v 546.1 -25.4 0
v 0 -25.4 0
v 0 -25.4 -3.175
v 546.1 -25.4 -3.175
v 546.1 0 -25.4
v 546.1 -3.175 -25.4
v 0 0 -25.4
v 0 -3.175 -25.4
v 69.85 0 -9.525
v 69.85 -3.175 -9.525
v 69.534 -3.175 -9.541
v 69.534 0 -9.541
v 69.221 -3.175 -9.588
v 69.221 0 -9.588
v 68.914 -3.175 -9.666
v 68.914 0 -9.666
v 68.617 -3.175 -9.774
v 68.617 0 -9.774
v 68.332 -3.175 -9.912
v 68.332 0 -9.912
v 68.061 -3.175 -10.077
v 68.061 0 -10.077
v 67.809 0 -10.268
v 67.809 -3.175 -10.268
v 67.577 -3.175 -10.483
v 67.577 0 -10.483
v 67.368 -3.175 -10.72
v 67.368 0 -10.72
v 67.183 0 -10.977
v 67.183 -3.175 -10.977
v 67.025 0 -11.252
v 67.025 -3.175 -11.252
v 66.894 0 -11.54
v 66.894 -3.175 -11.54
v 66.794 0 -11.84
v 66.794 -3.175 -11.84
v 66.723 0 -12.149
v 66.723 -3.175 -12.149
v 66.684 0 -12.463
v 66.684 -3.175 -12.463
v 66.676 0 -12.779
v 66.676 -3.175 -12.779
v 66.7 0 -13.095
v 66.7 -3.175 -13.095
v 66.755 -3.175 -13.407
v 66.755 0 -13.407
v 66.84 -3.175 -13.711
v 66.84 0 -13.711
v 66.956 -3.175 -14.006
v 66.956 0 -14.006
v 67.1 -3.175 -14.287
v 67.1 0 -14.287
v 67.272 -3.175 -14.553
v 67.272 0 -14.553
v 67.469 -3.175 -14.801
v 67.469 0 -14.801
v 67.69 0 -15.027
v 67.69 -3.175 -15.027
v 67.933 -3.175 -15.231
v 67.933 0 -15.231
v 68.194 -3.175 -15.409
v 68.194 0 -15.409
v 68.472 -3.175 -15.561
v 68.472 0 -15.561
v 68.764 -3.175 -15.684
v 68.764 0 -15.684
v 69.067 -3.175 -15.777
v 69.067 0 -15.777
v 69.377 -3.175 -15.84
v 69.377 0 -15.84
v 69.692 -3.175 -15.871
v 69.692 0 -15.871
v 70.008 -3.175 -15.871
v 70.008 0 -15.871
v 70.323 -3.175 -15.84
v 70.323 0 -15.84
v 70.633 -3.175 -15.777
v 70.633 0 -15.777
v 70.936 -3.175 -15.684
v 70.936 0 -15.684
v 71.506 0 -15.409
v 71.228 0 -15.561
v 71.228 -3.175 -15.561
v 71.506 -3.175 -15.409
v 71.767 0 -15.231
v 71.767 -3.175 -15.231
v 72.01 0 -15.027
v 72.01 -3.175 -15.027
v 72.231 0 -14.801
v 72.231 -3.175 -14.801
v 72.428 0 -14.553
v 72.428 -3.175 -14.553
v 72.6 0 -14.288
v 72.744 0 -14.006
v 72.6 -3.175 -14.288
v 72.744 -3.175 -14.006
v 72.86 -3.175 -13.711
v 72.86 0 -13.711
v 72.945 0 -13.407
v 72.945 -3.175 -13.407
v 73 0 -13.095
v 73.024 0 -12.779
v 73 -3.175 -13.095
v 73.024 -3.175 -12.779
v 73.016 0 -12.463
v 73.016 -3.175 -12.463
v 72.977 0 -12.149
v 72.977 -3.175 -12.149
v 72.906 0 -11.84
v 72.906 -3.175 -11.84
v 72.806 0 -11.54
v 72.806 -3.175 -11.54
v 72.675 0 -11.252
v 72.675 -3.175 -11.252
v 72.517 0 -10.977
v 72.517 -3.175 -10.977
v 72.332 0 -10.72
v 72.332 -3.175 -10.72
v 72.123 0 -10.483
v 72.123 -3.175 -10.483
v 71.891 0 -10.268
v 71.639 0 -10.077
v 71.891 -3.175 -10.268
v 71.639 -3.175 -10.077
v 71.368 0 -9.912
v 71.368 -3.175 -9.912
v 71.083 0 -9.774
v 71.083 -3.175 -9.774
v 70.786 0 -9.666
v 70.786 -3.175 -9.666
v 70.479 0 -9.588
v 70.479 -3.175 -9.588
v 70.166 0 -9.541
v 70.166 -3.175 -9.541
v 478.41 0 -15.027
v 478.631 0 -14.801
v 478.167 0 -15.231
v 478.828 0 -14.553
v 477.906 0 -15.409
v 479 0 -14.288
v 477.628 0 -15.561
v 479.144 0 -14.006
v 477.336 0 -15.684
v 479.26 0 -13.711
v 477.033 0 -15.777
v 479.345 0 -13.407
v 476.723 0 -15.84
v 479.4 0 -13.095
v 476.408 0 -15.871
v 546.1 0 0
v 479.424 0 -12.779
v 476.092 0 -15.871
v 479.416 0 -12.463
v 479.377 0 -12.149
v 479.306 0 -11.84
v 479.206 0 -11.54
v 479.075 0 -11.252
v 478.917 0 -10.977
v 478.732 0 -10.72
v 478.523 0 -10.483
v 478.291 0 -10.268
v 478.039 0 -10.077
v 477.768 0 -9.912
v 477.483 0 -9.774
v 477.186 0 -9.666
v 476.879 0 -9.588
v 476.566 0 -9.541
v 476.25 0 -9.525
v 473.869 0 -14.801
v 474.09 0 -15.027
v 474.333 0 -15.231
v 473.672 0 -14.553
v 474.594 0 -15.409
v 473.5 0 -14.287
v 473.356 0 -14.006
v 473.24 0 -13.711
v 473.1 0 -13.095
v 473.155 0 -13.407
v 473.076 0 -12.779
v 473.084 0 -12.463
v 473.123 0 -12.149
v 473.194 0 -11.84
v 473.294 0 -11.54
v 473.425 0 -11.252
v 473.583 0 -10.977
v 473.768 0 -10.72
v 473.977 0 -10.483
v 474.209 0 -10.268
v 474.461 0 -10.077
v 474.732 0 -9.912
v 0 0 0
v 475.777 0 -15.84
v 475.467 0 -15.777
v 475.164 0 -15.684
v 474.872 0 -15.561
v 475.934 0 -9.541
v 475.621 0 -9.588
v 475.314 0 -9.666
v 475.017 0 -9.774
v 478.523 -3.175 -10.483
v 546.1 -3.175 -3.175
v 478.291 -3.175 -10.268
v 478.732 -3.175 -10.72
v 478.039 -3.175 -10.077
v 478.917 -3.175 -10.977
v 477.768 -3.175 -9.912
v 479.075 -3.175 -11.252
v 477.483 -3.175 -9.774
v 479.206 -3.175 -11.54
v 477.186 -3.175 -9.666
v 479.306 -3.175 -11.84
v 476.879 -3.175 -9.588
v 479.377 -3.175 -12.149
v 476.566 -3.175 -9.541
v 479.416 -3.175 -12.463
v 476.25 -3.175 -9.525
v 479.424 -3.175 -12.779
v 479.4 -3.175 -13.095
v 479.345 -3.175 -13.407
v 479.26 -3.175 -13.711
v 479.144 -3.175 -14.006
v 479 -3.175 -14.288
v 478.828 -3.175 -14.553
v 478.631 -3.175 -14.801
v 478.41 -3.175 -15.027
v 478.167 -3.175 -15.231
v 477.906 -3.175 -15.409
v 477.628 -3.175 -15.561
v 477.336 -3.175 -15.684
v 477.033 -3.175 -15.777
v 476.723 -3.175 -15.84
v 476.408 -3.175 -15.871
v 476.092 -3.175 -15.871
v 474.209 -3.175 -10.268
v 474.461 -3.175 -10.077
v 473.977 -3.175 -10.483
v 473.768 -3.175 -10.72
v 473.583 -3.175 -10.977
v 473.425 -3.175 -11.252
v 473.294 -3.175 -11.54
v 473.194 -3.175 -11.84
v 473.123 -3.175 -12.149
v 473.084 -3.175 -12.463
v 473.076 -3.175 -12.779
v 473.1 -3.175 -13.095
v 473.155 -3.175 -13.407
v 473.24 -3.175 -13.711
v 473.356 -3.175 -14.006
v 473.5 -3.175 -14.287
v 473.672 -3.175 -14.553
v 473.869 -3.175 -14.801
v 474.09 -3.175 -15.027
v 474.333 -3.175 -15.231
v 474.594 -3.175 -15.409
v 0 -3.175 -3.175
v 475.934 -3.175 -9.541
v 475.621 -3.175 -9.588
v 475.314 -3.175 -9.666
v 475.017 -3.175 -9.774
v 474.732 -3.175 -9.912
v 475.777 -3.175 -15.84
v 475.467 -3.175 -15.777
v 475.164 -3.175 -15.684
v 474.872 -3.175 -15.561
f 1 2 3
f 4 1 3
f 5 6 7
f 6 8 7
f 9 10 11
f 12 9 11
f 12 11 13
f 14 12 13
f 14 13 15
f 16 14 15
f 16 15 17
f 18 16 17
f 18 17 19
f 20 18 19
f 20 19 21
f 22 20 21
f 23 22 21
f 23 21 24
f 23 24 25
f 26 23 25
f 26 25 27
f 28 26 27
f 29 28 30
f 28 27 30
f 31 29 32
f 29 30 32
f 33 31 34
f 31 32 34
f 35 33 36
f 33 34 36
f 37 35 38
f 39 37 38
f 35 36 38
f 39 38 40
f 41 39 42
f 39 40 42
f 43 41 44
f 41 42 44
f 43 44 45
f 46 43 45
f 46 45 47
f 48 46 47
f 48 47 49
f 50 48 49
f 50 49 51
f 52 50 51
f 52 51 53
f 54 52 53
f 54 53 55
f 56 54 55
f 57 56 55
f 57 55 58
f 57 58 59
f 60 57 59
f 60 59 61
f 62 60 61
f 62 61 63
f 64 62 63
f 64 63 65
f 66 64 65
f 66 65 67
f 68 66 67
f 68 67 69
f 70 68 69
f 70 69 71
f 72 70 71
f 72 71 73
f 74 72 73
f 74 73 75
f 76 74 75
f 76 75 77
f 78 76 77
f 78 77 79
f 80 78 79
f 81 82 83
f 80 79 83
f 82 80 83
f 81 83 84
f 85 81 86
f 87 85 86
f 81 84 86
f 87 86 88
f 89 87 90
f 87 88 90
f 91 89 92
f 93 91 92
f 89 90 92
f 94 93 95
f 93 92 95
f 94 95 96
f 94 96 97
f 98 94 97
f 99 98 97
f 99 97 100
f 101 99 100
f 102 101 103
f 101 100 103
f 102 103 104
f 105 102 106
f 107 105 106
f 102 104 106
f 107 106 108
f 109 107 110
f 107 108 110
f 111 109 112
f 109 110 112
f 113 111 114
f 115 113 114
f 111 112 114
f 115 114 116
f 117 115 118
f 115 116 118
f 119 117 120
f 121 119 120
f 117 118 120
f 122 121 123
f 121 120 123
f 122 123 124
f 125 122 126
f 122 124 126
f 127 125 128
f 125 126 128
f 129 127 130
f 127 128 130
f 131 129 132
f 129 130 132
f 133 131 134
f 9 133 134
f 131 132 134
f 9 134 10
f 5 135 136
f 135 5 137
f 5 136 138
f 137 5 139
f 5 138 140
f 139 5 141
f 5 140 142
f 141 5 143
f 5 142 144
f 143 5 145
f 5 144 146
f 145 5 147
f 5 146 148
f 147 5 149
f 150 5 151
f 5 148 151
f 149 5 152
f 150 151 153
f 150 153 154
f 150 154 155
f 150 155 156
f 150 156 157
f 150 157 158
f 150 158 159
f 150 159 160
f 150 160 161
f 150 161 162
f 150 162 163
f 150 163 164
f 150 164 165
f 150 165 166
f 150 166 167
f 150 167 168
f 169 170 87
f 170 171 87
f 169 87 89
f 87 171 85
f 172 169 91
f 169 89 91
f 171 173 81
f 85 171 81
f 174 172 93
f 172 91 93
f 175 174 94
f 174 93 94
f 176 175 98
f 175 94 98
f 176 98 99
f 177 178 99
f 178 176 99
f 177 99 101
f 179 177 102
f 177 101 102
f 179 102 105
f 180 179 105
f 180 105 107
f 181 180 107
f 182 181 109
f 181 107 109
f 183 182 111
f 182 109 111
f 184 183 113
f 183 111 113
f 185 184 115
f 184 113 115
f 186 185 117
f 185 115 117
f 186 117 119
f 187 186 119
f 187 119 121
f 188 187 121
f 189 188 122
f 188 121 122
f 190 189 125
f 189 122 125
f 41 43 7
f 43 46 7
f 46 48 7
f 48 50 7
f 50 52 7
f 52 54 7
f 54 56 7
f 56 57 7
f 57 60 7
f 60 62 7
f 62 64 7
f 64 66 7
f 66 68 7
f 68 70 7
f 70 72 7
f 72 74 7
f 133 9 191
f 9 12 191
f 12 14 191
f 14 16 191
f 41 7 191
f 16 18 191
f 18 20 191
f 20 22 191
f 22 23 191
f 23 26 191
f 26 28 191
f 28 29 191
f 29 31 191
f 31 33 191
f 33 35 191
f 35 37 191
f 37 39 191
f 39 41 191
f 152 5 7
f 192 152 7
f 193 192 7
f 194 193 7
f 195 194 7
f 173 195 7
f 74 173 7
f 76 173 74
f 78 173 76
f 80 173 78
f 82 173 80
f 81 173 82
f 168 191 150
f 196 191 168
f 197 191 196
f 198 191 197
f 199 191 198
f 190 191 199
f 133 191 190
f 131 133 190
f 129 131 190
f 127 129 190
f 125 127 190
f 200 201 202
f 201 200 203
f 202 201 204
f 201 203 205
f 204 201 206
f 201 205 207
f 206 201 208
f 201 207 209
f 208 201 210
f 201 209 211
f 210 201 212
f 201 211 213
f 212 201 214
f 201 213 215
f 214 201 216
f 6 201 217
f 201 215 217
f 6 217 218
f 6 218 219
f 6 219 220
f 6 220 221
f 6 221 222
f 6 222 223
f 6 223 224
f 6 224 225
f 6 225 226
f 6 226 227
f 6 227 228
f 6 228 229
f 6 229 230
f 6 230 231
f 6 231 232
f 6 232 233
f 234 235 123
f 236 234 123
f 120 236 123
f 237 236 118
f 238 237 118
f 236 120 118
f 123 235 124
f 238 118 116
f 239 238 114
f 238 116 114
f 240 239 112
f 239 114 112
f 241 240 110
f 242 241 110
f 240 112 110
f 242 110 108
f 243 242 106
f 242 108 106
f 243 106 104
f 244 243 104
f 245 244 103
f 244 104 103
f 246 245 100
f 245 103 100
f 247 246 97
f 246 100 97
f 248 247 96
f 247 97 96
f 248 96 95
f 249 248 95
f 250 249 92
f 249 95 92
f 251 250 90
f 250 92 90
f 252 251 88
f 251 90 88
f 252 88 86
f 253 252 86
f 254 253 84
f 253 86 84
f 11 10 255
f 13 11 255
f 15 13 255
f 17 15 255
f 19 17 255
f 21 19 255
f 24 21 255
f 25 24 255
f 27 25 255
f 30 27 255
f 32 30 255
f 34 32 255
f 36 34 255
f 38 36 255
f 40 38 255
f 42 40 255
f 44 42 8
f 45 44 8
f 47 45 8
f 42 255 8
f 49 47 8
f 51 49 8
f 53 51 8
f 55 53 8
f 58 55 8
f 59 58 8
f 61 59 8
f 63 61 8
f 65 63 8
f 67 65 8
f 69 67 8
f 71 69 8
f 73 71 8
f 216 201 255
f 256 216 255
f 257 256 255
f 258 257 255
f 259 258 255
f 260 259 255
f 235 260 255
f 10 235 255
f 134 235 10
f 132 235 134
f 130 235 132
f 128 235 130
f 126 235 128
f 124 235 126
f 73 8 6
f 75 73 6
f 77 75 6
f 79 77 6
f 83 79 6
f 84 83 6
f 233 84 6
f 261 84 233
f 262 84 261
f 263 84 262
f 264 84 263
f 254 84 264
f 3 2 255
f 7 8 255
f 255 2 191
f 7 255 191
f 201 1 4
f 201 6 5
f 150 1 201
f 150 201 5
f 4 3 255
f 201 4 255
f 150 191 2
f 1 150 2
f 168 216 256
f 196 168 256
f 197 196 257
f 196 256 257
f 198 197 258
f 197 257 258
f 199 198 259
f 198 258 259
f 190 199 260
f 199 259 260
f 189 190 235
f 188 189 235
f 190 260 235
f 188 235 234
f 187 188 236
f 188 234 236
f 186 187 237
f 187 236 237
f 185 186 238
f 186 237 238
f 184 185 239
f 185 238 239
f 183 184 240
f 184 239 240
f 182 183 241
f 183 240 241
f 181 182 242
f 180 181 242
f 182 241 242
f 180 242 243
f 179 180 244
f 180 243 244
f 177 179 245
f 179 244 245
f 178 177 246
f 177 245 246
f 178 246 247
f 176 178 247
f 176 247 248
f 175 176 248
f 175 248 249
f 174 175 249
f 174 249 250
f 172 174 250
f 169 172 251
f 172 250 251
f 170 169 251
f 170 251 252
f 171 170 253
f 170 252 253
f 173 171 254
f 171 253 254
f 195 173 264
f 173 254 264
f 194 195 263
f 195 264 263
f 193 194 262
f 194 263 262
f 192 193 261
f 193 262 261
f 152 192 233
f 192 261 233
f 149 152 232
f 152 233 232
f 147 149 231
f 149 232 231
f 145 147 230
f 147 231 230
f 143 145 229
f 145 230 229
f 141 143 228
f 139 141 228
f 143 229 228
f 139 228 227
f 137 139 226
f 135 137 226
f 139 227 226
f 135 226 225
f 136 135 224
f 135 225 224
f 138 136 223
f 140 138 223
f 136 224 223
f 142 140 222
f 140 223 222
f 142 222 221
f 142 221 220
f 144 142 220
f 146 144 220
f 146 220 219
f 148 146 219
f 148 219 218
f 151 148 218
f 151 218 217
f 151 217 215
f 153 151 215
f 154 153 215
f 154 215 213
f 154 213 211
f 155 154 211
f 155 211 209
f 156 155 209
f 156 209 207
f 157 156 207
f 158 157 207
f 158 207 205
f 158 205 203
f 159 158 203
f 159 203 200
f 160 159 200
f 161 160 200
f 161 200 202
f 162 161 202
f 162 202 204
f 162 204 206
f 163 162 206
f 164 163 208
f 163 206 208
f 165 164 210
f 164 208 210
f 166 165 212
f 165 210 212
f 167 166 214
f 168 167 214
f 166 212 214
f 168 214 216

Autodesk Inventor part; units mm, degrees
ref_plane "YZ Plane" through (0, 0, 0) normal (1, 0, 0) x (0, 1, 0)
ref_plane "XZ Plane" through (0, 0, 0) normal (0, 1, 0) x (-1, 0, 0)
ref_plane "XY Plane" through (0, 0, 0) normal (0, 0, 1) x (1, 0, 0)
sketch "Sketch1" plane through (0, 0, 0) normal (1, 0, 0) x (0, 1, 0)
  line L0 (0, 0) -> (-3.175, 0)
  line L1 (-3.175, 0) -> (-3.175, -25.4)
  line L2 (-3.175, -25.4) -> (0, -25.4)
  line L3 (0, -25.4) -> (0, 0)
  line L4 (0, 0) -> (-25.4, 0)
  line L5 (-25.4, 0) -> (-25.4, -3.175)
  line L6 (-25.4, -3.175) -> (0, -3.175)
  line L7 (0, -3.175) -> (0, 0)
  dimension "d0" = 3.175
  dimension "d1" = 25.4
  dimension "d2" = 25.4
  dimension "d3" = 3.175
extrude "Extrusion1" add sketch "Sketch1" along normal blind 546.1
sketch "Sketch2" plane through (0, 0, 0) normal (0, 1, 0) x (1, 0, 0)
  line L0 (0, 25.4) -> (0, 0) projected
  line L1 (0, 0) -> (546.1, 0) projected
  line L2 (546.1, 25.4) -> (546.1, 0) projected
  point P0 (476.25, 12.7)
  point P1 (69.85, 12.7)
  dimension "d6" = 69.85
  dimension "d7" = 12.7
  dimension "d8" = 69.85
  dimension "d9" = 12.7
hole "Hole1" at (476.25, 0, -12.7) at (69.85, 0, -12.7) direction (0, -1, 0) diameter 6.35 end through all
properties part number "pool noodle guard 1x1 angle"
